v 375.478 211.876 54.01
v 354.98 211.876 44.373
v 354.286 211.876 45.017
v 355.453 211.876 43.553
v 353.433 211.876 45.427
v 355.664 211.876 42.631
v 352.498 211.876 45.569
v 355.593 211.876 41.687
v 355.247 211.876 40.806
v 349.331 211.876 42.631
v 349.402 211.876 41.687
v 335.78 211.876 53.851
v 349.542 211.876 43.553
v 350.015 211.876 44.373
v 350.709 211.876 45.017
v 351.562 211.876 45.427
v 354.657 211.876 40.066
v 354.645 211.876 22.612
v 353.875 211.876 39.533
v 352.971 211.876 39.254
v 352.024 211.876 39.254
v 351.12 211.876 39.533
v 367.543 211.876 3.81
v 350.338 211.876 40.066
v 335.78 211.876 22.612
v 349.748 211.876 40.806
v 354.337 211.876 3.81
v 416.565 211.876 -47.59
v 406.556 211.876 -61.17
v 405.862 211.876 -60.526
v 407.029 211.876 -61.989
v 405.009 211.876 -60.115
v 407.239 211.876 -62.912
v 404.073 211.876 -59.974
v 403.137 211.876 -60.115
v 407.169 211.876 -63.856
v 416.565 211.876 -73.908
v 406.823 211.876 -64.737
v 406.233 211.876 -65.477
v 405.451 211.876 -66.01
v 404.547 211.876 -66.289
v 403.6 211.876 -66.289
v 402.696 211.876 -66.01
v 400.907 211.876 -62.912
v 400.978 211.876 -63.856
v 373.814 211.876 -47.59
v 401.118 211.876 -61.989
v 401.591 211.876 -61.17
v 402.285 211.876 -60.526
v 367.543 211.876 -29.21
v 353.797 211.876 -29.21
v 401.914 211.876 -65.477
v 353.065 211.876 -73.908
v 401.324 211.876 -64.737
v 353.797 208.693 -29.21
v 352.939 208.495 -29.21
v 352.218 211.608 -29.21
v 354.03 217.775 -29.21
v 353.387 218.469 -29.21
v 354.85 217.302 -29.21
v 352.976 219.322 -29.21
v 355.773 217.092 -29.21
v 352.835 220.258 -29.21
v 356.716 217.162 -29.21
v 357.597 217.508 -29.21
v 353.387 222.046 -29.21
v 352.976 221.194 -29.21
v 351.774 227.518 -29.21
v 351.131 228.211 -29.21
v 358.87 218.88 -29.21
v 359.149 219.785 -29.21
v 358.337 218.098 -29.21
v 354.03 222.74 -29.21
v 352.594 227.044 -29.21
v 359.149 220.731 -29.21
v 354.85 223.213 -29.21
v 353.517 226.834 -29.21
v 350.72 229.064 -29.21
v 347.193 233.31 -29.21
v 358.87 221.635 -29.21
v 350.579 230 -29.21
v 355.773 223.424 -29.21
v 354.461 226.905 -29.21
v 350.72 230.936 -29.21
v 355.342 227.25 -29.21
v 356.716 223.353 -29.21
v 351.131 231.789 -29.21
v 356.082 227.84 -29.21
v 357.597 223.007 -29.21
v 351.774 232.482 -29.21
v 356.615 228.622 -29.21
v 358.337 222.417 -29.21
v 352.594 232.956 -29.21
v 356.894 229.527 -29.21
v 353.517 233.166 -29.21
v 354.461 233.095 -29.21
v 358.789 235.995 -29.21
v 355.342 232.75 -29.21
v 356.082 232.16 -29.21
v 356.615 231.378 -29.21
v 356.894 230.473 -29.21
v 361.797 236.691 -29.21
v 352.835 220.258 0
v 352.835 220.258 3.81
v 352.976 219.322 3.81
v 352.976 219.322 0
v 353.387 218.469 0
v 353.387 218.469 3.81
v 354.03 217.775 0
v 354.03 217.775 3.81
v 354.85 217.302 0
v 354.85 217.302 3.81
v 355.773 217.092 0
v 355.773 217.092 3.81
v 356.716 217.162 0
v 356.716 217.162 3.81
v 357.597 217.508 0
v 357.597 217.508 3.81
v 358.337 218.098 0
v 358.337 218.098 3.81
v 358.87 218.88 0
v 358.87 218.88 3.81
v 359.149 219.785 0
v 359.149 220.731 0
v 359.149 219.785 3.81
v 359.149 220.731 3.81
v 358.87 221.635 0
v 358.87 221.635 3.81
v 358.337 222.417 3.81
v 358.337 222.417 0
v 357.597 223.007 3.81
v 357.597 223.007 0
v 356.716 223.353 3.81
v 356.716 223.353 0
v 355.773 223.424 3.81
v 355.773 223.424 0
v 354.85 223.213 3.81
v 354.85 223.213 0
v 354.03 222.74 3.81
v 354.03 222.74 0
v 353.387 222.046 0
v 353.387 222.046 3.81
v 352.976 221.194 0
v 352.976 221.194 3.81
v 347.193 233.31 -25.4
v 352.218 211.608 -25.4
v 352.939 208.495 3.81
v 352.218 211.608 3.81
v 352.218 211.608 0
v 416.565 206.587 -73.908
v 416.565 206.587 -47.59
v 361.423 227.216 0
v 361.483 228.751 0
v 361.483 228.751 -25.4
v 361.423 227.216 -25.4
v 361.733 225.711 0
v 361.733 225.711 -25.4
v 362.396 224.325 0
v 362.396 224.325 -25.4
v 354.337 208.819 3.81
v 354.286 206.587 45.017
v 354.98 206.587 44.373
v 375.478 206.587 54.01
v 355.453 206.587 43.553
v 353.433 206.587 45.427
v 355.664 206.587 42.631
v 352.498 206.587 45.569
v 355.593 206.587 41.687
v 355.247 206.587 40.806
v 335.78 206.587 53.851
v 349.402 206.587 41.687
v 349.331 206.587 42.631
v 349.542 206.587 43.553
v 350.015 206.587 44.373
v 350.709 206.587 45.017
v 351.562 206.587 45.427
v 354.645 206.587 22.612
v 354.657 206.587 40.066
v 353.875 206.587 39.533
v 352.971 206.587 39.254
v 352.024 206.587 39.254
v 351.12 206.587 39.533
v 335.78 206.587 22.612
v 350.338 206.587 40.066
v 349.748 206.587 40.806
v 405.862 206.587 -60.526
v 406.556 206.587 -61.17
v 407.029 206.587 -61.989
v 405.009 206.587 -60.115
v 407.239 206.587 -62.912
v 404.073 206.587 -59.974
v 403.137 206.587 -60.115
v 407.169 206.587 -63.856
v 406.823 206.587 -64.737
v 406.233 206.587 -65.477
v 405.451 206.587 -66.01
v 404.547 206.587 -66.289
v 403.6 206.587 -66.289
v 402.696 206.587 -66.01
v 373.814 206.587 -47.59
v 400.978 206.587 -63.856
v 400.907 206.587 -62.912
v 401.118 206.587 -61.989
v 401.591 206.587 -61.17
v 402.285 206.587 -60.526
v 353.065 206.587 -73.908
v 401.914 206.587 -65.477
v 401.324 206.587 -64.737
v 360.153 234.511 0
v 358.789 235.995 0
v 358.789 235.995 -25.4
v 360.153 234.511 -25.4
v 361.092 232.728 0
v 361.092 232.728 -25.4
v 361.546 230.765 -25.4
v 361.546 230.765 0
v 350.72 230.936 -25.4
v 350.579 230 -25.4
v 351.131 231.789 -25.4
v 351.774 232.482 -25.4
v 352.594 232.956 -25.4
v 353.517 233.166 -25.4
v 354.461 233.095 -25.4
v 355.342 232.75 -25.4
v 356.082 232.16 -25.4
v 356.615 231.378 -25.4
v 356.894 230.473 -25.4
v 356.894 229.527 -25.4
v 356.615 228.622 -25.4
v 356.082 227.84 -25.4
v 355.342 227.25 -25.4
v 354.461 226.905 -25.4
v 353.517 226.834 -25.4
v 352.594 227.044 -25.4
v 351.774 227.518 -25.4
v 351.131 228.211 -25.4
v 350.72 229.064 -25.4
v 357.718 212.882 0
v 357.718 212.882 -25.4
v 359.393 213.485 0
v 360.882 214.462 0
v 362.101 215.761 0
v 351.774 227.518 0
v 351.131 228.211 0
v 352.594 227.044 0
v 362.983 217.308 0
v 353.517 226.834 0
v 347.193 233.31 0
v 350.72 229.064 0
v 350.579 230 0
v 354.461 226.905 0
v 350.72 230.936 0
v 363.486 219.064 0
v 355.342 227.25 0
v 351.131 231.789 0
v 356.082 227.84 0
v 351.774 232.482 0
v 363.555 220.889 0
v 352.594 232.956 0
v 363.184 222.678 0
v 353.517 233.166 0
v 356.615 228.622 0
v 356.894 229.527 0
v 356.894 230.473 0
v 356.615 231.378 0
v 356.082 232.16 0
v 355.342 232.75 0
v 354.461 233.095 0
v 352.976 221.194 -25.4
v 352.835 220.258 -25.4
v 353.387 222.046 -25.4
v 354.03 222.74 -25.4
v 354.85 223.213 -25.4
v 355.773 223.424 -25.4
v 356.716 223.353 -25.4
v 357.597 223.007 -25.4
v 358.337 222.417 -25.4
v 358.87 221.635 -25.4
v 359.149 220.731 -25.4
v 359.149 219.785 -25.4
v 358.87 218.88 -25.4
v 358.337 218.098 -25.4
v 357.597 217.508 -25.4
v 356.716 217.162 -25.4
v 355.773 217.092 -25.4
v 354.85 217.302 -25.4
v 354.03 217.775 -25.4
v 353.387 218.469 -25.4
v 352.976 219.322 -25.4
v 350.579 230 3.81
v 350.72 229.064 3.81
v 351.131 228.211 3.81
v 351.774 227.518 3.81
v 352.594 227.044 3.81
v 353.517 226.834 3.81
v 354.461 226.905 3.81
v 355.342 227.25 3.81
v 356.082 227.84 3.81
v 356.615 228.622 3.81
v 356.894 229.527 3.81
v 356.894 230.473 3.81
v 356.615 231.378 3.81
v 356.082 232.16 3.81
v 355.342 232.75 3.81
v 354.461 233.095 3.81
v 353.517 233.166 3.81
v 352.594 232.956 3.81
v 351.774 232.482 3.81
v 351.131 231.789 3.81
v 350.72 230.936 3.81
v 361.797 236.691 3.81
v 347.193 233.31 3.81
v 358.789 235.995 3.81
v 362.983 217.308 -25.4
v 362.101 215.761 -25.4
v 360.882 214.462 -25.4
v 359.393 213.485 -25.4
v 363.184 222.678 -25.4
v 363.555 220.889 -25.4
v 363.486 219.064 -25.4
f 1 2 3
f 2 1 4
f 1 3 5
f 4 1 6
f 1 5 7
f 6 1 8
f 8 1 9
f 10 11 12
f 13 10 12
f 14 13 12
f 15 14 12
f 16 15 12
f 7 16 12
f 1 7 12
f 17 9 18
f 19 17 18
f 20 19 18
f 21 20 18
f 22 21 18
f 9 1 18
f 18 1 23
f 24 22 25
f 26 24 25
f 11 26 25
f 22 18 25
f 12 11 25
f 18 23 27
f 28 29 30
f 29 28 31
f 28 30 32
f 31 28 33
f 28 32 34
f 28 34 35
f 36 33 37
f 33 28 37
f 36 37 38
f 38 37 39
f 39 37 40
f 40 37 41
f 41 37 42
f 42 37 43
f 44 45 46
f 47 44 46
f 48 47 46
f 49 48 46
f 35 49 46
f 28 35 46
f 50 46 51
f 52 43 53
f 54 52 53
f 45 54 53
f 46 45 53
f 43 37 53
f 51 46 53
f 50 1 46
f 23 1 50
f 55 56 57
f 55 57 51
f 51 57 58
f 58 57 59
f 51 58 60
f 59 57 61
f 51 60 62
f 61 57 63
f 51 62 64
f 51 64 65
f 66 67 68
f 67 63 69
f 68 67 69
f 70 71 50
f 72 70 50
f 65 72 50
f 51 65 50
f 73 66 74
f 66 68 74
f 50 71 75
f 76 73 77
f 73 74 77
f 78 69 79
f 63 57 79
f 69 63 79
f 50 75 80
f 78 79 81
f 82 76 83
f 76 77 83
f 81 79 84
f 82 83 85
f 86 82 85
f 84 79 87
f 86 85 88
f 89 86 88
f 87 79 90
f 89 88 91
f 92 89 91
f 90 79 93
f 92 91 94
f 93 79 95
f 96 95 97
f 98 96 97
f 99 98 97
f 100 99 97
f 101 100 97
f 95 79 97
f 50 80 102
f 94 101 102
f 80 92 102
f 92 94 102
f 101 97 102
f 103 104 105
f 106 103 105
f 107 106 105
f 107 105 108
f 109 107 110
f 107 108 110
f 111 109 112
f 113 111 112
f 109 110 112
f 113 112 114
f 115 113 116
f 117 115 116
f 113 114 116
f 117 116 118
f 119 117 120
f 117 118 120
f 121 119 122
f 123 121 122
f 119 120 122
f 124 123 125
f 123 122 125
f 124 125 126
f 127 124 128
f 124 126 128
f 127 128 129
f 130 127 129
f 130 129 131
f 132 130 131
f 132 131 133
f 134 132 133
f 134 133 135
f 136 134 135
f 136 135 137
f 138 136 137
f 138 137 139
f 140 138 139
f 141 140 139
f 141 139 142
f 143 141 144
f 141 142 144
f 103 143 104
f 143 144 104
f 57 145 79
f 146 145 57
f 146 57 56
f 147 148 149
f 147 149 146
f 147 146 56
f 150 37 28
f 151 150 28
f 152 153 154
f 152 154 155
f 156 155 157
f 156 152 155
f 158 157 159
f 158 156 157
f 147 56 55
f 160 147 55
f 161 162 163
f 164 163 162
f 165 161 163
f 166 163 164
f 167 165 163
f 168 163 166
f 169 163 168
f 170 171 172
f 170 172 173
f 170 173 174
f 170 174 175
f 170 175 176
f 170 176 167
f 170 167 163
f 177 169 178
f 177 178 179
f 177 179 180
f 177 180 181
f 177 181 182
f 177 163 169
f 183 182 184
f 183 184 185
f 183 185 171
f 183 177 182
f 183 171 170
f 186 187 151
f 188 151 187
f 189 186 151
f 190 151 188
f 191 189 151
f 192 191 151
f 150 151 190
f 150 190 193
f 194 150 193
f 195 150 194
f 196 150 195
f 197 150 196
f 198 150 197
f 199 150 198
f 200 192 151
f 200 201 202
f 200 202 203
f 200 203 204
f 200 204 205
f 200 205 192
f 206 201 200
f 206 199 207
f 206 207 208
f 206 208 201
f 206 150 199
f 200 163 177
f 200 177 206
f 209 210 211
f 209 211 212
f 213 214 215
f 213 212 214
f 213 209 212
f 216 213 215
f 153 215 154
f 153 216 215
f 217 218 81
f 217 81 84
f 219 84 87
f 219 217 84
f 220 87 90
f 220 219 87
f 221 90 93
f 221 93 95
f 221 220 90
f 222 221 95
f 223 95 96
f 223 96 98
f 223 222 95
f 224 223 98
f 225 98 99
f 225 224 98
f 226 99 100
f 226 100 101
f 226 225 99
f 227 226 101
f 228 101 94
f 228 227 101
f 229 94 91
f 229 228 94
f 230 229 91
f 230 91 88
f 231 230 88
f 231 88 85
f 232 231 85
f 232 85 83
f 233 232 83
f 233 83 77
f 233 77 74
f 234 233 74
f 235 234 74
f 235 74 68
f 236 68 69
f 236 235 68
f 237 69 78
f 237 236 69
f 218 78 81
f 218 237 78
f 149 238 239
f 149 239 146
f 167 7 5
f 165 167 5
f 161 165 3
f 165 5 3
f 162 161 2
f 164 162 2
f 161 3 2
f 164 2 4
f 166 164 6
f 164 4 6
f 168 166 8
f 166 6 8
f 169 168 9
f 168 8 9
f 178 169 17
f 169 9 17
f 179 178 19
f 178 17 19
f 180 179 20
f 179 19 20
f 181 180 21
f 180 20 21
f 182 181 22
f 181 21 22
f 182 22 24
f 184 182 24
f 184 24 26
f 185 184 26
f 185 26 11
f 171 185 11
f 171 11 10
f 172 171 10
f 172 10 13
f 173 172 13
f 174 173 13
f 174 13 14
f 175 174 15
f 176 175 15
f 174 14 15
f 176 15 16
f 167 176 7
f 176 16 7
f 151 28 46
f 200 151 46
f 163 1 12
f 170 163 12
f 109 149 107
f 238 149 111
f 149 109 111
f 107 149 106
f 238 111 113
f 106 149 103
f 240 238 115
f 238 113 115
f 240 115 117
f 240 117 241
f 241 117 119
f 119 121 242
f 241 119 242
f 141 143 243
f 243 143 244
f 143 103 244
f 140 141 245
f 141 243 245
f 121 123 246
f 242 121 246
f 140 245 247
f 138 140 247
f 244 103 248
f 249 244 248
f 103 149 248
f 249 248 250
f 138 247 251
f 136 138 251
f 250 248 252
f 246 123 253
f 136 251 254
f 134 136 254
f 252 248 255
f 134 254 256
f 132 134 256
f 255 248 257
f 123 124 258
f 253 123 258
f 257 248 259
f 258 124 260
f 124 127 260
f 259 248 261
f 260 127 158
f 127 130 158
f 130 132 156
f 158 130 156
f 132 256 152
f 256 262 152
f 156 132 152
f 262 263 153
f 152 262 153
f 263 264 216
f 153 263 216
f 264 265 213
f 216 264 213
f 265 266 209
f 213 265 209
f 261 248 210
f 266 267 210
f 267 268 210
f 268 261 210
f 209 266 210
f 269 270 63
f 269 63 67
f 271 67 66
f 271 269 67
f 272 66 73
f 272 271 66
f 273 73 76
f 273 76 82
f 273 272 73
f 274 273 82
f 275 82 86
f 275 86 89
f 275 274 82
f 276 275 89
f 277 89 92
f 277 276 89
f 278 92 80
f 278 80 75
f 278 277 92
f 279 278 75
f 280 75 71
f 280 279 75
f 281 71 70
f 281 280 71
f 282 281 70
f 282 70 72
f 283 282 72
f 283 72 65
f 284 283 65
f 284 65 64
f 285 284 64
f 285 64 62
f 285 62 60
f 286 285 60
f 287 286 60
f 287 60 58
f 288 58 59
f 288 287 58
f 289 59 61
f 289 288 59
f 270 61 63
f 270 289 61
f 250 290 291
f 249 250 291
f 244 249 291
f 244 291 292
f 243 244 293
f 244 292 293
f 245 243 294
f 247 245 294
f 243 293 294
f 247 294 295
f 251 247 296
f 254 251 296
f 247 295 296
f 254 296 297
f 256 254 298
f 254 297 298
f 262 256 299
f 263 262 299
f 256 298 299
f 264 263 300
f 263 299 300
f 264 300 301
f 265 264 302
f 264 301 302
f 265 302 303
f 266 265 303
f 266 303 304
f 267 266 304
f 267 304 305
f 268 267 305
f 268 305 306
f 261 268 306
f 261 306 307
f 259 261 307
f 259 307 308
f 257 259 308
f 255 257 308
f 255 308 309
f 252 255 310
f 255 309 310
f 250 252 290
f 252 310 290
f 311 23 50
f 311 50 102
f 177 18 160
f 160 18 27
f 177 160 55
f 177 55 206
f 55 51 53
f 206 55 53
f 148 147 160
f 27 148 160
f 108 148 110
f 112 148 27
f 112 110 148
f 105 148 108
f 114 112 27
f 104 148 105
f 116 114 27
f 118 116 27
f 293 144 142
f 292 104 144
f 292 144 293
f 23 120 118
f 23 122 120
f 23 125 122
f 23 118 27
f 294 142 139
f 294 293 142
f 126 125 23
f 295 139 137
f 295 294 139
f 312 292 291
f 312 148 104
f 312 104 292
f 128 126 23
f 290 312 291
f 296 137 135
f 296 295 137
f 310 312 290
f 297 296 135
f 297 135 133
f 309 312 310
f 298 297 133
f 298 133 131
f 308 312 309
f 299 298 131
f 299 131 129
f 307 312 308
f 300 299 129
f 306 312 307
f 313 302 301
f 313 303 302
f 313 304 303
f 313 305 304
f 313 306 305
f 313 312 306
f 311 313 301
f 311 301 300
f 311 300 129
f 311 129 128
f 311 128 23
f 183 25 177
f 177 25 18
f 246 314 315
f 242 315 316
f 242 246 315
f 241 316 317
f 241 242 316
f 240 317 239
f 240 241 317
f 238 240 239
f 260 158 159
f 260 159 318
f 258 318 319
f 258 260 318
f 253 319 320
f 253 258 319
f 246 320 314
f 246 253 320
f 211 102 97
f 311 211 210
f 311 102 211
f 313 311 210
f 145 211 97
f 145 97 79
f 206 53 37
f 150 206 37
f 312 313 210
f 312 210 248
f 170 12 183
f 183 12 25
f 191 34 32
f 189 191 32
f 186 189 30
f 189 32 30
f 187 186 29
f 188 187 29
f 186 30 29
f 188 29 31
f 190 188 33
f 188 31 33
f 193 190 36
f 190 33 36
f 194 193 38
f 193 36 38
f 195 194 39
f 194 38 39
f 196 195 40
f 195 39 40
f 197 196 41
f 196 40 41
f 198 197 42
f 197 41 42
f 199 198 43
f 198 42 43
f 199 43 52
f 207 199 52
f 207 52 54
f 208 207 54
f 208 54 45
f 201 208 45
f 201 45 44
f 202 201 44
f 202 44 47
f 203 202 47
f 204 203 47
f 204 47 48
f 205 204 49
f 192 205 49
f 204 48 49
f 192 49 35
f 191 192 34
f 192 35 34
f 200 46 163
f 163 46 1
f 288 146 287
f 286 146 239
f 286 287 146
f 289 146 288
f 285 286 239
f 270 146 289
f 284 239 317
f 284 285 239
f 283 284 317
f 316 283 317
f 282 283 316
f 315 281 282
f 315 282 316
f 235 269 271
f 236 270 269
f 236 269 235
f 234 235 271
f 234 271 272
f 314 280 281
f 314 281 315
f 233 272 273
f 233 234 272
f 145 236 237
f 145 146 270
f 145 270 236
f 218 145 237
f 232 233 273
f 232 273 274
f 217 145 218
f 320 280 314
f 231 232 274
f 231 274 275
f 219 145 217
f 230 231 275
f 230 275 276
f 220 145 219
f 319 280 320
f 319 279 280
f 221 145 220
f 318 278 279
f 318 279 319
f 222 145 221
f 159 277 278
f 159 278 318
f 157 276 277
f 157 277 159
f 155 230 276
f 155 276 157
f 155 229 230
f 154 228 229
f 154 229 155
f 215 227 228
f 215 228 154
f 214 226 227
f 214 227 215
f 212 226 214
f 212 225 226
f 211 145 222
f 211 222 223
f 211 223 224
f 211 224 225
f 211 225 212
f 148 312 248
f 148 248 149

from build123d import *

# Parameters (mm, degrees)
BOSS_EXTRUDE1_DEPTH = 29.21
BOSS_EXTRUDE2_START = -3.81
SKETCH2_R           = 3.175
BOSS_EXTRUDE2_DEPTH = 3.81
BOSS_EXTRUDE3_START = 3.81
SKETCH3_R           = 3.175
BOSS_EXTRUDE3_DEPTH = 3.81
SKETCH5_R           = 3.175
BOSS_EXTRUDE4_DEPTH = 5.2893214


with BuildPart() as part:
    # Sketch1 → Boss-Extrude1 (new body)
    with BuildSketch(Plane.XY):
        with BuildLine():
            Line((357.71784023, 212.881801123), (352.217914789, 211.608277369))
            Line((352.217914789, 211.608277369), (352.938839753, 208.494842277))
            Line((352.938839753, 208.494842277), (367.542855209, 211.876444589))
            Line((367.542855209, 211.876444589), (361.796858989, 236.691490786))
            Line((361.796858989, 236.691490786), (358.789055407, 235.995025106))
            ThreePointArc((358.789055407, 235.995025106), (361.092162023, 232.728335773), (361.482600287, 228.750507566))
            ThreePointArc((361.482600287, 228.750507566), (361.532171417, 226.454028373), (362.395514522, 224.325434315))
            ThreePointArc((362.395514522, 224.325434315), (363.554671569, 220.88901177), (362.982664296, 217.307747657))
            ThreePointArc((362.982664296, 217.307747657), (360.881852793, 214.462416261), (357.71784023, 212.881801123))
        make_face()
    extrude(amount=-BOSS_EXTRUDE1_DEPTH)

    # Sketch2 → Boss-Extrude2 (add)
    with BuildSketch(Plane(origin=(0, 0, -29.21), x_dir=(-1, 0, 0), z_dir=(0, 0, -1)).offset(BOSS_EXTRUDE2_START)):
        with BuildLine():
            Line((-347.192843533, 233.309888473), (-352.217914789, 211.608277369))
            Line((-352.217914789, 211.608277369), (-357.71784023, 212.881801123))
            ThreePointArc((-357.71784023, 212.881801123), (-363.018157919, 217.393089456), (-362.395514522, 224.325434315))
            ThreePointArc((-362.395514522, 224.325434315), (-361.532171417, 226.454028373), (-361.482600287, 228.750507566))
            ThreePointArc((-361.482600287, 228.750507566), (-361.092162023, 232.728335773), (-358.789055407, 235.995025106))
            Line((-358.789055407, 235.995025106), (-347.192843533, 233.309888473))
        make_face()
        with Locations((-356.009914651, 220.257763535)):
            Circle(SKETCH2_R, mode=Mode.SUBTRACT)
        with Locations((-353.754071424, 230)):
            Circle(SKETCH2_R, mode=Mode.SUBTRACT)
    extrude(amount=BOSS_EXTRUDE2_DEPTH)

    # Sketch3 → Boss-Extrude3 (add)
    # profile 1 of 2: a face of its own
    with BuildSketch(Plane.XY.offset(BOSS_EXTRUDE3_START)):
        with BuildLine():
            Line((358.789055407, 235.995025106), (347.192843533, 233.309888473))
            Line((347.192843533, 233.309888473), (352.217914789, 211.608277369))
            Line((352.217914789, 211.608277369), (357.71784023, 212.881801123))
            ThreePointArc((357.71784023, 212.881801123), (363.018157919, 217.393089456), (362.395514522, 224.325434315))
            ThreePointArc((362.395514522, 224.325434315), (361.532171417, 226.454028373), (361.482600287, 228.750507566))
            ThreePointArc((361.482600287, 228.750507566), (361.092162023, 232.728335773), (358.789055407, 235.995025106))
        make_face()
        with Locations(Location((356.009914651, 220.257763535, 0), (0, 0, 180))):
            Circle(SKETCH3_R, mode=Mode.SUBTRACT)
        with Locations(Location((353.754071424, 230, 0), (0, 0, 180))):
            Circle(SKETCH3_R, mode=Mode.SUBTRACT)
    # profile 2 of 2: a face of its own
    with BuildSketch(Plane.XY.offset(BOSS_EXTRUDE3_START)):
        with BuildLine():
            ThreePointArc((361.482600287, 228.750507566), (361.532171417, 226.454028373), (362.395514522, 224.325434315))
            ThreePointArc((362.395514522, 224.325434315), (363.018157919, 217.393089456), (357.71784023, 212.881801123))
            Line((357.71784023, 212.881801123), (352.217914789, 211.608277369))
            Line((352.217914789, 211.608277369), (352.938839753, 208.494842277))
            Line((352.938839753, 208.494842277), (367.542855209, 211.876444589))
            Line((367.542855209, 211.876444589), (361.796858989, 236.691490786))
            Line((361.796858989, 236.691490786), (358.789055407, 235.995025106))
            ThreePointArc((358.789055407, 235.995025106), (361.092162023, 232.728335773), (361.482600287, 228.750507566))
        make_face()
    extrude(amount=-BOSS_EXTRUDE3_DEPTH)

    # Sketch5 → Boss-Extrude4 (add)
    with BuildSketch(Plane(origin=(0, 211.876444589, 0), x_dir=(1, 0, 0), z_dir=(0, 1, 0))):
        Polygon((353.064855209, 73.907779308), (416.564855209, 73.907779308), (416.564855209, 47.589788729), (373.814351909, 47.589788729), (375.477626365, -54.010211271), (335.779852437, -53.851377651), (335.779852437, -22.612220692), (354.644965943, -22.612220692), align=None)
        with Locations(Location((404.073297936, 63.14930327, 0), (0, 0, 270))):
            Circle(SKETCH5_R, mode=Mode.SUBTRACT)
        with Locations(Location((352.49755845, -42.393532045, 0), (0, 0, 270))):
            Circle(SKETCH5_R, mode=Mode.SUBTRACT)
    extrude(amount=-BOSS_EXTRUDE4_DEPTH)


solid = part.part
